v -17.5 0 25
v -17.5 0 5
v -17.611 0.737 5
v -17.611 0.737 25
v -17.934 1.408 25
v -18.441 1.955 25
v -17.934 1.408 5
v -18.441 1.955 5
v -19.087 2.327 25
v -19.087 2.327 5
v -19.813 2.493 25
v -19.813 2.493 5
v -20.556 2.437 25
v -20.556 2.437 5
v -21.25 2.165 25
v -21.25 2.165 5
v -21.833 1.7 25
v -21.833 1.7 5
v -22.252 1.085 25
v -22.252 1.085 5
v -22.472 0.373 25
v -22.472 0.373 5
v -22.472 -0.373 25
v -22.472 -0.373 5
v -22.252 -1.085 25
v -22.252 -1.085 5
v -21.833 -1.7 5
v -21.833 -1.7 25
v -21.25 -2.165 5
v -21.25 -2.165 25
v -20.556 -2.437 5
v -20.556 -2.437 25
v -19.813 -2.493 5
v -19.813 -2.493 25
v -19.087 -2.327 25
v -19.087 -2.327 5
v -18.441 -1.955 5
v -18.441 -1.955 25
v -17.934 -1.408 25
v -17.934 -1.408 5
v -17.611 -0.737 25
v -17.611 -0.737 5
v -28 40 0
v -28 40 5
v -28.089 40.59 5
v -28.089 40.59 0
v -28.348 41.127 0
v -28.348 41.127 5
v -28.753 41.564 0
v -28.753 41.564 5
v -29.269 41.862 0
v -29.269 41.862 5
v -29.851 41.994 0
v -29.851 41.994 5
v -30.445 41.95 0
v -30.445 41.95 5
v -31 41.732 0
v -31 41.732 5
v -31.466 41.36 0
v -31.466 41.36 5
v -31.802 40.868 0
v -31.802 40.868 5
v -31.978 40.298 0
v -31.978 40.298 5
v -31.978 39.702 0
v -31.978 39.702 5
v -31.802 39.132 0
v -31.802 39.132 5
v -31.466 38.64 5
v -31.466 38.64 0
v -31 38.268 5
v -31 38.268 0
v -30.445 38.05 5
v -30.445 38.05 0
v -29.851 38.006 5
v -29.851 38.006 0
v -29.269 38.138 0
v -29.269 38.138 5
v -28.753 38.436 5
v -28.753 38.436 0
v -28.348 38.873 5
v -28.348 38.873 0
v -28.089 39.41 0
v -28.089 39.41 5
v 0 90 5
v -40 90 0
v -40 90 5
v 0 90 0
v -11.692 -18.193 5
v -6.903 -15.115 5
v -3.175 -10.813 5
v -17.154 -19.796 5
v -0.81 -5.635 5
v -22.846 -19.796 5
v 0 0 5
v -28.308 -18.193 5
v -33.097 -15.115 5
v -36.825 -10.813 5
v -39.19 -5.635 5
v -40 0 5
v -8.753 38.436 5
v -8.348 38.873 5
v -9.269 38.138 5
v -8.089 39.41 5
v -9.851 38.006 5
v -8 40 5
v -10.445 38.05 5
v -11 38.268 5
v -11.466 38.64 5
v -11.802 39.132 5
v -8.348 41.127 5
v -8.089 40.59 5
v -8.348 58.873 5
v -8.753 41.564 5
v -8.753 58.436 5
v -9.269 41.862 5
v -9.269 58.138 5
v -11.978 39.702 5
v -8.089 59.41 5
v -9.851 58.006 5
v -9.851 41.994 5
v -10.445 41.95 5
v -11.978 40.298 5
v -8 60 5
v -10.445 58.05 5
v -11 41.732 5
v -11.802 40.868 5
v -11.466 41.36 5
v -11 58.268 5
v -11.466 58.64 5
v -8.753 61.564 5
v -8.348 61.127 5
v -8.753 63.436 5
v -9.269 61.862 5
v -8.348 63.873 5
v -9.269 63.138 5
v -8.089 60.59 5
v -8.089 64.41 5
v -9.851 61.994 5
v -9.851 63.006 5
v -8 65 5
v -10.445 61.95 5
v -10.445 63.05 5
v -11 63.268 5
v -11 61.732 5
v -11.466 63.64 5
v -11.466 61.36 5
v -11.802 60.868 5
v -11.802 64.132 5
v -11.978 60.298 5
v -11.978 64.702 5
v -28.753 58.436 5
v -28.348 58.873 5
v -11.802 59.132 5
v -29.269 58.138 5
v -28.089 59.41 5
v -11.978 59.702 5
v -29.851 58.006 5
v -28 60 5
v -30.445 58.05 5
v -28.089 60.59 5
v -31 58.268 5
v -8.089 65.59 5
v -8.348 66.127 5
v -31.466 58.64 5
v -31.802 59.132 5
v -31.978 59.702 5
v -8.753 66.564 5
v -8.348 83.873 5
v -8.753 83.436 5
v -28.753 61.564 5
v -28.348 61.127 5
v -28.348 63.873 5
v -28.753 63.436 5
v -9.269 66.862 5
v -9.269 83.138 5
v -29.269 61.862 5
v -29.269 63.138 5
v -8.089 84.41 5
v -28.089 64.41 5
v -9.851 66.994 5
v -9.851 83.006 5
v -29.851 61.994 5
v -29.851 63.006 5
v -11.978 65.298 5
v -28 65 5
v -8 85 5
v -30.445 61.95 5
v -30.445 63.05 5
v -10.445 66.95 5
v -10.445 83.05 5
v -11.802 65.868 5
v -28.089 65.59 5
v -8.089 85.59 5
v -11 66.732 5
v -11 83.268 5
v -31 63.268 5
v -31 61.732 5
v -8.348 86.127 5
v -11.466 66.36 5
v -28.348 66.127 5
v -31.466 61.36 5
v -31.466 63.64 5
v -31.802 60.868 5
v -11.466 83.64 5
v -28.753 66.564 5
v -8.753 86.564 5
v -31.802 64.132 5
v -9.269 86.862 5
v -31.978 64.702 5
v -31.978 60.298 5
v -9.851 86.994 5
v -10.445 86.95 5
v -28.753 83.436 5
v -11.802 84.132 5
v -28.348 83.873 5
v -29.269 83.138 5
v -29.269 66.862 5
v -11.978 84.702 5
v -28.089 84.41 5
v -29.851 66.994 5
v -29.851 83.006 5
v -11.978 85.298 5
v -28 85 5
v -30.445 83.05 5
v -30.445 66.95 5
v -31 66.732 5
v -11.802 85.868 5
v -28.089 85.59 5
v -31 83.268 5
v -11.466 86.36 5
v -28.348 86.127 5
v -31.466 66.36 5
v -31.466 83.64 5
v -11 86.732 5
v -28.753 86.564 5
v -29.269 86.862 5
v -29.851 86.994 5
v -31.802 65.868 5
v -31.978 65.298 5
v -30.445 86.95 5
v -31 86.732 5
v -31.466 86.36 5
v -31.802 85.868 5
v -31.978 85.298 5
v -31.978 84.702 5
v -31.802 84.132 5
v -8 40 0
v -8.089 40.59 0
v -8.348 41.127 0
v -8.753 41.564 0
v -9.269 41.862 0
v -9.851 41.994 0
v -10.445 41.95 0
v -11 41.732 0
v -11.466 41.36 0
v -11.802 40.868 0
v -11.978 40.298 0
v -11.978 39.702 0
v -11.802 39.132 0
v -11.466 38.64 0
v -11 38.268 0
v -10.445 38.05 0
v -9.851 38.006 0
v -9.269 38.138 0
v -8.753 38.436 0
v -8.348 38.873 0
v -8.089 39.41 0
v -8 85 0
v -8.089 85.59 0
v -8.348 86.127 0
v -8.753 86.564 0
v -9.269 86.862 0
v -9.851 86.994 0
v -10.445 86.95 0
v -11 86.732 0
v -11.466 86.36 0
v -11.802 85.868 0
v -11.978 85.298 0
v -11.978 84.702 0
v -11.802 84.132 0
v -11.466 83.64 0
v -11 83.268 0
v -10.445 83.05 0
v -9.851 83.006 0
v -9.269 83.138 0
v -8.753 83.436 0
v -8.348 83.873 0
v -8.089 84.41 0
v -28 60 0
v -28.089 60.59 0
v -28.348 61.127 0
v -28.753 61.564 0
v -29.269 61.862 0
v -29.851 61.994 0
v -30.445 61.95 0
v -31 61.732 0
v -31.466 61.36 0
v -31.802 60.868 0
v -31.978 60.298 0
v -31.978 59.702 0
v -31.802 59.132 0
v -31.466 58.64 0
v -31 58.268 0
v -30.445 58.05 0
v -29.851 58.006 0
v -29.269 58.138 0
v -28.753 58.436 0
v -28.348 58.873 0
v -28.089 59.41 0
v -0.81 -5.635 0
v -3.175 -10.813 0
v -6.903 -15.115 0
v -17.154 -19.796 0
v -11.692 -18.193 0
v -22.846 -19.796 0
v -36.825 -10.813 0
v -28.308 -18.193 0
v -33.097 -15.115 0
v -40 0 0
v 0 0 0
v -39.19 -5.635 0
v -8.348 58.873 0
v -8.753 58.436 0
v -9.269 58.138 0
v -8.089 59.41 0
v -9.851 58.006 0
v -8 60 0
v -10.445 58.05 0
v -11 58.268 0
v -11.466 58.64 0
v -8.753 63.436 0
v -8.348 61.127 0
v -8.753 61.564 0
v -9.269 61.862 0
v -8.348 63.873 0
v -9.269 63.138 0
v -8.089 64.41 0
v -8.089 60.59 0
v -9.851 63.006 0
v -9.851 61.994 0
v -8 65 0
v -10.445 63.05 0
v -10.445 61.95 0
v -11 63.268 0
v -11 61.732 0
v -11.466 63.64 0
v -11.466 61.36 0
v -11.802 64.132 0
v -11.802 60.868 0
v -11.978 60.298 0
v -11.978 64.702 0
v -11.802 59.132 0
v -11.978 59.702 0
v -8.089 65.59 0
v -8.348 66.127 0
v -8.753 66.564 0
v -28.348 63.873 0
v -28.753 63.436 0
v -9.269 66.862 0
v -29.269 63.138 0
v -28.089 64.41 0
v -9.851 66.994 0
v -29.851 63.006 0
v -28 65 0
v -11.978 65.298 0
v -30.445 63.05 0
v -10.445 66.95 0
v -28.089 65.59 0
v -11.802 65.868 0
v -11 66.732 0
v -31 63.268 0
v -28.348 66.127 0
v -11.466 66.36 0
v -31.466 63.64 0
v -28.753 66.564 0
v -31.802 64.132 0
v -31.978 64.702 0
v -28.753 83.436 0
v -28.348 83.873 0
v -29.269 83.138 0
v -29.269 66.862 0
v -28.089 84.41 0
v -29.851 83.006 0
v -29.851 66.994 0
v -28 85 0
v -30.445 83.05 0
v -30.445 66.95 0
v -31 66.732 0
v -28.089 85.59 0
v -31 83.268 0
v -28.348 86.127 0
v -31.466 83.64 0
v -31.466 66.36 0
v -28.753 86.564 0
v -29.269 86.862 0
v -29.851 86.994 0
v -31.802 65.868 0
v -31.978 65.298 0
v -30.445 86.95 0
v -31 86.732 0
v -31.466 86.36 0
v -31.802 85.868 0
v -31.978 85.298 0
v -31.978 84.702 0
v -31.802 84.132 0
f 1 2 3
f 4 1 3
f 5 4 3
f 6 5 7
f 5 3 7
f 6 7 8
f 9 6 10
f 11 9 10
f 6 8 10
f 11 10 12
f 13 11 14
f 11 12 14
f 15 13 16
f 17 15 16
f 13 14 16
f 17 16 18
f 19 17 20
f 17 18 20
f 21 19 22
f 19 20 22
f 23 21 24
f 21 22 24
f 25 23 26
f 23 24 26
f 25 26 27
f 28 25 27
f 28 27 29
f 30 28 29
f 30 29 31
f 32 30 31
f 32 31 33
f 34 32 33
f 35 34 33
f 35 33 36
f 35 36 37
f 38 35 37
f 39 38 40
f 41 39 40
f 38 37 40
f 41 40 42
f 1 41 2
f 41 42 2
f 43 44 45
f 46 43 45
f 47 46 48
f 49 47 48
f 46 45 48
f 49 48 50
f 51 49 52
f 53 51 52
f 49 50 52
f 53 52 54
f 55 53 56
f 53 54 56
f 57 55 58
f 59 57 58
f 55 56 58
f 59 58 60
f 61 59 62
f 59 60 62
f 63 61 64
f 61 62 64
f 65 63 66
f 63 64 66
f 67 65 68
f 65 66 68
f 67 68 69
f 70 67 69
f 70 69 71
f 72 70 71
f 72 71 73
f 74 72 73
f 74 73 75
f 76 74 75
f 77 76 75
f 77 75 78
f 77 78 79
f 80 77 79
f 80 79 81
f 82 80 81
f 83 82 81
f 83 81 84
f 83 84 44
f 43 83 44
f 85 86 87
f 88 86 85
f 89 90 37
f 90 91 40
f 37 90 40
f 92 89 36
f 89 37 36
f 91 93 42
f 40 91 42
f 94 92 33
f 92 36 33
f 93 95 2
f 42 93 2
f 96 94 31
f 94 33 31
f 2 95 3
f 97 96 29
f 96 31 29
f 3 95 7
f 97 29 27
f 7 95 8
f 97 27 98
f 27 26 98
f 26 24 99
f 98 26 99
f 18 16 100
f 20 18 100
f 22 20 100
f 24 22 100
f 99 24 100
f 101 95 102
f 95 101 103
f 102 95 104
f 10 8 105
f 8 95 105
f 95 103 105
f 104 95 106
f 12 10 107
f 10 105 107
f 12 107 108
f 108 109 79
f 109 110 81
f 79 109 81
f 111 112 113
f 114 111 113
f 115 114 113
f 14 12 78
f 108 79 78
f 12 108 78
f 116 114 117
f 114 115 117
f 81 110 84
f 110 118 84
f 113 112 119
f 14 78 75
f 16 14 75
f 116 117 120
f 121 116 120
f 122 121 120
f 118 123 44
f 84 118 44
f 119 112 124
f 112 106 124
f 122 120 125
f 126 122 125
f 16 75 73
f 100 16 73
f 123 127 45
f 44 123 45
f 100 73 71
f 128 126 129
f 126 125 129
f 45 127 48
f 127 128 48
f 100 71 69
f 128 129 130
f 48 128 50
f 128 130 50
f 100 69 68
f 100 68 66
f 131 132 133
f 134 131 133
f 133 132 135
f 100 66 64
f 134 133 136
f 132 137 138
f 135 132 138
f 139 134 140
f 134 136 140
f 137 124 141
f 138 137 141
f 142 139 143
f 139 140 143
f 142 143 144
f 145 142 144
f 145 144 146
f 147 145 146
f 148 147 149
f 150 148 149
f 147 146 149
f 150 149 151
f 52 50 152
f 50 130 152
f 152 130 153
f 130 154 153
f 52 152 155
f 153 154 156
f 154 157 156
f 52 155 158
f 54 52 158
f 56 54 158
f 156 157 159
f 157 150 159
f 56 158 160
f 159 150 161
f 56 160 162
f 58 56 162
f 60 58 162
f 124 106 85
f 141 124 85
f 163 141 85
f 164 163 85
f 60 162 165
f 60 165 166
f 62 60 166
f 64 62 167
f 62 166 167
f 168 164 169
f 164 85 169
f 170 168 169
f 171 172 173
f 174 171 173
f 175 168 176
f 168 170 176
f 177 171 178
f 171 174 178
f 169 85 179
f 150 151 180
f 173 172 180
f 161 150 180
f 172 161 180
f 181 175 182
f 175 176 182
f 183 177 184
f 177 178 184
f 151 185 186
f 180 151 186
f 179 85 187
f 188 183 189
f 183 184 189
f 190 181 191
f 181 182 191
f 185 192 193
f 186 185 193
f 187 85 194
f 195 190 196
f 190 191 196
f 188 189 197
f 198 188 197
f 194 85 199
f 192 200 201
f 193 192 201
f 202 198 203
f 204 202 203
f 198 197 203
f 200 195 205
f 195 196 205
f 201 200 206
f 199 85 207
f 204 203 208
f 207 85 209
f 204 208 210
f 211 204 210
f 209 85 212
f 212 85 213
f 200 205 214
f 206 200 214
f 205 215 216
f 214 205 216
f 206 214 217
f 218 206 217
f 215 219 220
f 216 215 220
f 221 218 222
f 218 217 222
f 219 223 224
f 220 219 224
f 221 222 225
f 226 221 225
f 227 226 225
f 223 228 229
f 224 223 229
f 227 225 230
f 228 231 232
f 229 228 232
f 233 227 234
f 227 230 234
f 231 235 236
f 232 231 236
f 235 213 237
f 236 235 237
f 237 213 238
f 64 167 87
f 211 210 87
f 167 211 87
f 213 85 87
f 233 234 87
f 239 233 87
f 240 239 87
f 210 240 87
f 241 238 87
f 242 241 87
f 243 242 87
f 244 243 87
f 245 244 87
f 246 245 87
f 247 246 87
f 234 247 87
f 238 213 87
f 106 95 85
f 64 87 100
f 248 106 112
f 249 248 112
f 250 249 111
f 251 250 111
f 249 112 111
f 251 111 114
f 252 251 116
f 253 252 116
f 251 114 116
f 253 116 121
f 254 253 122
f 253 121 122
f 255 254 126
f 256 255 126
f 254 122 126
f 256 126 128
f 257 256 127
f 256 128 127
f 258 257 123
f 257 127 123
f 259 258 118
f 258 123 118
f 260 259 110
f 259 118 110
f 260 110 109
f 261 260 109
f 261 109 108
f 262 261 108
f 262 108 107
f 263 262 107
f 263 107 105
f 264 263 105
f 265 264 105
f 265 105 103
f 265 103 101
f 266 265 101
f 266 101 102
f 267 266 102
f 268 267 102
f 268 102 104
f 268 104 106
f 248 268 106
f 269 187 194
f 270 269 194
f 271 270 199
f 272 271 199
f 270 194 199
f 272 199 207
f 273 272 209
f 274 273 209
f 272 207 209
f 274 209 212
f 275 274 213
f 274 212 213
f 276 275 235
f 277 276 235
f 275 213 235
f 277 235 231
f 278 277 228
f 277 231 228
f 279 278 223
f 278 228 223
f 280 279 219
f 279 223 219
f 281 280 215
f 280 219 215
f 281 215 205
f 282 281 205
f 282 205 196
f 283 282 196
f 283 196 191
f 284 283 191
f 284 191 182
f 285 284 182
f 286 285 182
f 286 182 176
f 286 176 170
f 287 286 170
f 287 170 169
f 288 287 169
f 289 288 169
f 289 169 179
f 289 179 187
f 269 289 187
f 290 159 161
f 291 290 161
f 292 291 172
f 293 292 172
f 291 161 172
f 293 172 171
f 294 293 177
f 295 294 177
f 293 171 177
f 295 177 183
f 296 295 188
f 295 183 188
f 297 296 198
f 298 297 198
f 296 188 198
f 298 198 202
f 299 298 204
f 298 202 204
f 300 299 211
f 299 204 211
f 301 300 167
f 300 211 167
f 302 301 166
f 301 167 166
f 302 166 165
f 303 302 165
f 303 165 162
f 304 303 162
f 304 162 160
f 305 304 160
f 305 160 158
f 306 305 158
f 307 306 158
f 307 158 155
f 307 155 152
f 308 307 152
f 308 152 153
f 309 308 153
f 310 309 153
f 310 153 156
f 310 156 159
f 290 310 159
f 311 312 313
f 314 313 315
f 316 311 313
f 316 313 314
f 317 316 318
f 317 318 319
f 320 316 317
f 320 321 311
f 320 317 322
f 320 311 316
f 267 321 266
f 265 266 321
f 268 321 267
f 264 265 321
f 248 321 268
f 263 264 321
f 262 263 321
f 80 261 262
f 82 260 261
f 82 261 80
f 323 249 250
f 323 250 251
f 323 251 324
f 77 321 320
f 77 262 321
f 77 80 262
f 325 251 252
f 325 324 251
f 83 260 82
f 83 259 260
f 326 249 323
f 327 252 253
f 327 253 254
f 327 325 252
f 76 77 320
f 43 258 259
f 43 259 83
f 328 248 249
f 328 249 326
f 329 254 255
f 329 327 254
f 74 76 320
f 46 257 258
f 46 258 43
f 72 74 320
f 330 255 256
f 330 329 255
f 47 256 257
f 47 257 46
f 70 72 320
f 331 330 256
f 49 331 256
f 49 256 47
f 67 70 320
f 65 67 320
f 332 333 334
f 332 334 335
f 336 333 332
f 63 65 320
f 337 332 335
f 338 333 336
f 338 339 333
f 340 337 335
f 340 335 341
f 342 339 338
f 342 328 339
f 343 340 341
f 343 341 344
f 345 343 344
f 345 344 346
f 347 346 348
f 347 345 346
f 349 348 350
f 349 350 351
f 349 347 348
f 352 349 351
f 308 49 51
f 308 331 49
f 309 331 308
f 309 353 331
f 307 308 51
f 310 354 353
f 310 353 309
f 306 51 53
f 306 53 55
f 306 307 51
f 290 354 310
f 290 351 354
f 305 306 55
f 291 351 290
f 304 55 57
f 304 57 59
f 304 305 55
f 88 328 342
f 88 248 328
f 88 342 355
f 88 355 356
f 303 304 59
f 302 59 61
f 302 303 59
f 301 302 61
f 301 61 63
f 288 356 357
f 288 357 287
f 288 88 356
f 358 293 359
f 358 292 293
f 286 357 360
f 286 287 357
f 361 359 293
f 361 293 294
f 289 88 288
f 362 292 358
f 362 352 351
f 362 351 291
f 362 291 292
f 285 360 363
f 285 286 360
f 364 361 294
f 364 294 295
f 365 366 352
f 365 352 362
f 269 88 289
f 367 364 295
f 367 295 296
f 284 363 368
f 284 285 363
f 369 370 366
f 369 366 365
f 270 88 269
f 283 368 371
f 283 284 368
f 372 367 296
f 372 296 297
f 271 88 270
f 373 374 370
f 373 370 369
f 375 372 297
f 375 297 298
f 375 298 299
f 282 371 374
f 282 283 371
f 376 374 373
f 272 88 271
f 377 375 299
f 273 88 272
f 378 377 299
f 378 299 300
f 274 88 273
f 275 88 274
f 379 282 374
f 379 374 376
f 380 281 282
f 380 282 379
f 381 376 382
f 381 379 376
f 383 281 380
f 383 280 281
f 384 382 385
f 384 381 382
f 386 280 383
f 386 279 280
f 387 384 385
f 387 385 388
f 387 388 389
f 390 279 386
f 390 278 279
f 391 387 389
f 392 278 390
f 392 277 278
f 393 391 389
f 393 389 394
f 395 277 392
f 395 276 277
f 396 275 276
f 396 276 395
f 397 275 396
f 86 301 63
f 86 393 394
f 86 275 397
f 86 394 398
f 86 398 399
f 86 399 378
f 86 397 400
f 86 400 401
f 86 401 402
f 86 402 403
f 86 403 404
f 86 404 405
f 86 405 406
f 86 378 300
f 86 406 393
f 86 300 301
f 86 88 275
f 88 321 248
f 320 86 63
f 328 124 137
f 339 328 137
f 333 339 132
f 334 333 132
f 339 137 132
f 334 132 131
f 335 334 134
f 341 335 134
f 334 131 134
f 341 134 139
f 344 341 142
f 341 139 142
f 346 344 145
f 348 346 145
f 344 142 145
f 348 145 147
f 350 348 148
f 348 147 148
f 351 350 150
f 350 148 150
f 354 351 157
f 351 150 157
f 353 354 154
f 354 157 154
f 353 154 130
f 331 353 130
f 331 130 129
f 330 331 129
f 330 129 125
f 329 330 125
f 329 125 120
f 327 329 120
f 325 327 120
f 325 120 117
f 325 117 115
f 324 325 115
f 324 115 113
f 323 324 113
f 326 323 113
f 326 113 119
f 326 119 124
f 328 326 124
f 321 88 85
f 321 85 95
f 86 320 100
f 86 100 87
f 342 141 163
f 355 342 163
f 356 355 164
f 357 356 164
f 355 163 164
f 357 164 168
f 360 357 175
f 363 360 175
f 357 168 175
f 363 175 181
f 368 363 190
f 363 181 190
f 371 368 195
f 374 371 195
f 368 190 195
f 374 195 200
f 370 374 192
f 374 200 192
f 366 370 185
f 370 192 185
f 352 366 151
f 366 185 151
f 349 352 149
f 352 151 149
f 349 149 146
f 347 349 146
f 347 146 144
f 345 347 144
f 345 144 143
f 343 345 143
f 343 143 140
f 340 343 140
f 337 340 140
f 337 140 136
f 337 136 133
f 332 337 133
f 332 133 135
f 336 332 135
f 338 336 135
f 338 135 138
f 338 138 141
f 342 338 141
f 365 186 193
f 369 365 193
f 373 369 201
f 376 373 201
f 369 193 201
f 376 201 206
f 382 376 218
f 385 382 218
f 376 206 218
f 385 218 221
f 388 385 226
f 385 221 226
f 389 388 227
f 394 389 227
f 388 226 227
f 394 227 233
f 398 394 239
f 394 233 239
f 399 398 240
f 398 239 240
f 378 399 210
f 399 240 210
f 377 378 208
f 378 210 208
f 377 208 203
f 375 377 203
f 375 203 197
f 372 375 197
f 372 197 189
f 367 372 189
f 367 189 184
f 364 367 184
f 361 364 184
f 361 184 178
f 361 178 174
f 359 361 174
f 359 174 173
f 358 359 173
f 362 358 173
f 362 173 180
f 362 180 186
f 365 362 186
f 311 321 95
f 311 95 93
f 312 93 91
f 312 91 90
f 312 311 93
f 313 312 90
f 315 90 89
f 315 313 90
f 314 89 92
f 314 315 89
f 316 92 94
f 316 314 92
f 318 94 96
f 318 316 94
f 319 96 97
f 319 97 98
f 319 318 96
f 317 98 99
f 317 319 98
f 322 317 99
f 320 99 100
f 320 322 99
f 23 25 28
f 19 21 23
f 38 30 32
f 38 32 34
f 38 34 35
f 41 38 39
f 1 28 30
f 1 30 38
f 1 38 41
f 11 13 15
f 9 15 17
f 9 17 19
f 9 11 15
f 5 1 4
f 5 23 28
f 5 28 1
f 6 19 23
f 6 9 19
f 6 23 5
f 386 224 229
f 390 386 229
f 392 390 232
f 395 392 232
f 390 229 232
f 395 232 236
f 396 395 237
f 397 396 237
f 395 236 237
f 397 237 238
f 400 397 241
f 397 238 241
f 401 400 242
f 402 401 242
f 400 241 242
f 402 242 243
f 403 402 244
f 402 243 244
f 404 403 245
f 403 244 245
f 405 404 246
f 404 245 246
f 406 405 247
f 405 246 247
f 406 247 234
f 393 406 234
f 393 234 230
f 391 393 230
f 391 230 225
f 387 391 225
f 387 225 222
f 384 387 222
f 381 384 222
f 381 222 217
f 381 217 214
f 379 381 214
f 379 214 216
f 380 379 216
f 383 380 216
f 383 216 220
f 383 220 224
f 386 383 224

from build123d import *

# Parameters (mm, degrees)
BOSS_EXTRUDE1_DEPTH = 5
SKETCH2_R           = 2.5
BOSS_EXTRUDE2_DEPTH = 20
SKETCH3_R           = 2
CUT_EXTRUDE1_DEPTH  = 50
SKETCH5_R           = 2
CUT_EXTRUDE2_DEPTH  = 50
LPATTERN1_COUNT     = 2
LPATTERN1_PITCH     = 20


with BuildPart() as part:
    # Sketch1 → Boss-Extrude1 (new body)
    with BuildSketch(Plane.XY):
        with BuildLine():
            Line((-40, 90), (0, 90))
            Line((0, 90), (0, 0))
            ThreePointArc((0, 0), (-20, -20), (-40, 0))
            Line((-40, 0), (-40, 90))
        make_face()
    extrude(amount=BOSS_EXTRUDE1_DEPTH)

    # Sketch2 → Boss-Extrude2 (add)
    with BuildSketch(Plane.XY.offset(5)):
        with Locations((-20, 0)):
            Circle(SKETCH2_R)
    extrude(amount=BOSS_EXTRUDE2_DEPTH)

    # Sketch3 → Cut-Extrude1 (cut)
    with BuildSketch(Plane.XY.offset(5)):
        with Locations((-30, 85)):
            Circle(SKETCH3_R)
        with Locations((-10, 85)):
            Circle(SKETCH3_R)
    cut_extrude1 = extrude(amount=-CUT_EXTRUDE1_DEPTH, mode=Mode.SUBTRACT)

    # Sketch5 → Cut-Extrude2 (cut)
    with BuildSketch(Plane.XY.offset(5)):
        with Locations((-30, 60)):
            Circle(SKETCH5_R)
        with Locations((-10, 60)):
            Circle(SKETCH5_R)
    cut_extrude2 = extrude(amount=-CUT_EXTRUDE2_DEPTH, mode=Mode.SUBTRACT)

    # LPattern1: Cut-Extrude1, Cut-Extrude2 ×2
    with Locations(*[(0, -i * LPATTERN1_PITCH, 0) for i in range(1, LPATTERN1_COUNT)]):
        add(cut_extrude1, mode=Mode.SUBTRACT)
        add(cut_extrude2, mode=Mode.SUBTRACT)


solid = part.part
